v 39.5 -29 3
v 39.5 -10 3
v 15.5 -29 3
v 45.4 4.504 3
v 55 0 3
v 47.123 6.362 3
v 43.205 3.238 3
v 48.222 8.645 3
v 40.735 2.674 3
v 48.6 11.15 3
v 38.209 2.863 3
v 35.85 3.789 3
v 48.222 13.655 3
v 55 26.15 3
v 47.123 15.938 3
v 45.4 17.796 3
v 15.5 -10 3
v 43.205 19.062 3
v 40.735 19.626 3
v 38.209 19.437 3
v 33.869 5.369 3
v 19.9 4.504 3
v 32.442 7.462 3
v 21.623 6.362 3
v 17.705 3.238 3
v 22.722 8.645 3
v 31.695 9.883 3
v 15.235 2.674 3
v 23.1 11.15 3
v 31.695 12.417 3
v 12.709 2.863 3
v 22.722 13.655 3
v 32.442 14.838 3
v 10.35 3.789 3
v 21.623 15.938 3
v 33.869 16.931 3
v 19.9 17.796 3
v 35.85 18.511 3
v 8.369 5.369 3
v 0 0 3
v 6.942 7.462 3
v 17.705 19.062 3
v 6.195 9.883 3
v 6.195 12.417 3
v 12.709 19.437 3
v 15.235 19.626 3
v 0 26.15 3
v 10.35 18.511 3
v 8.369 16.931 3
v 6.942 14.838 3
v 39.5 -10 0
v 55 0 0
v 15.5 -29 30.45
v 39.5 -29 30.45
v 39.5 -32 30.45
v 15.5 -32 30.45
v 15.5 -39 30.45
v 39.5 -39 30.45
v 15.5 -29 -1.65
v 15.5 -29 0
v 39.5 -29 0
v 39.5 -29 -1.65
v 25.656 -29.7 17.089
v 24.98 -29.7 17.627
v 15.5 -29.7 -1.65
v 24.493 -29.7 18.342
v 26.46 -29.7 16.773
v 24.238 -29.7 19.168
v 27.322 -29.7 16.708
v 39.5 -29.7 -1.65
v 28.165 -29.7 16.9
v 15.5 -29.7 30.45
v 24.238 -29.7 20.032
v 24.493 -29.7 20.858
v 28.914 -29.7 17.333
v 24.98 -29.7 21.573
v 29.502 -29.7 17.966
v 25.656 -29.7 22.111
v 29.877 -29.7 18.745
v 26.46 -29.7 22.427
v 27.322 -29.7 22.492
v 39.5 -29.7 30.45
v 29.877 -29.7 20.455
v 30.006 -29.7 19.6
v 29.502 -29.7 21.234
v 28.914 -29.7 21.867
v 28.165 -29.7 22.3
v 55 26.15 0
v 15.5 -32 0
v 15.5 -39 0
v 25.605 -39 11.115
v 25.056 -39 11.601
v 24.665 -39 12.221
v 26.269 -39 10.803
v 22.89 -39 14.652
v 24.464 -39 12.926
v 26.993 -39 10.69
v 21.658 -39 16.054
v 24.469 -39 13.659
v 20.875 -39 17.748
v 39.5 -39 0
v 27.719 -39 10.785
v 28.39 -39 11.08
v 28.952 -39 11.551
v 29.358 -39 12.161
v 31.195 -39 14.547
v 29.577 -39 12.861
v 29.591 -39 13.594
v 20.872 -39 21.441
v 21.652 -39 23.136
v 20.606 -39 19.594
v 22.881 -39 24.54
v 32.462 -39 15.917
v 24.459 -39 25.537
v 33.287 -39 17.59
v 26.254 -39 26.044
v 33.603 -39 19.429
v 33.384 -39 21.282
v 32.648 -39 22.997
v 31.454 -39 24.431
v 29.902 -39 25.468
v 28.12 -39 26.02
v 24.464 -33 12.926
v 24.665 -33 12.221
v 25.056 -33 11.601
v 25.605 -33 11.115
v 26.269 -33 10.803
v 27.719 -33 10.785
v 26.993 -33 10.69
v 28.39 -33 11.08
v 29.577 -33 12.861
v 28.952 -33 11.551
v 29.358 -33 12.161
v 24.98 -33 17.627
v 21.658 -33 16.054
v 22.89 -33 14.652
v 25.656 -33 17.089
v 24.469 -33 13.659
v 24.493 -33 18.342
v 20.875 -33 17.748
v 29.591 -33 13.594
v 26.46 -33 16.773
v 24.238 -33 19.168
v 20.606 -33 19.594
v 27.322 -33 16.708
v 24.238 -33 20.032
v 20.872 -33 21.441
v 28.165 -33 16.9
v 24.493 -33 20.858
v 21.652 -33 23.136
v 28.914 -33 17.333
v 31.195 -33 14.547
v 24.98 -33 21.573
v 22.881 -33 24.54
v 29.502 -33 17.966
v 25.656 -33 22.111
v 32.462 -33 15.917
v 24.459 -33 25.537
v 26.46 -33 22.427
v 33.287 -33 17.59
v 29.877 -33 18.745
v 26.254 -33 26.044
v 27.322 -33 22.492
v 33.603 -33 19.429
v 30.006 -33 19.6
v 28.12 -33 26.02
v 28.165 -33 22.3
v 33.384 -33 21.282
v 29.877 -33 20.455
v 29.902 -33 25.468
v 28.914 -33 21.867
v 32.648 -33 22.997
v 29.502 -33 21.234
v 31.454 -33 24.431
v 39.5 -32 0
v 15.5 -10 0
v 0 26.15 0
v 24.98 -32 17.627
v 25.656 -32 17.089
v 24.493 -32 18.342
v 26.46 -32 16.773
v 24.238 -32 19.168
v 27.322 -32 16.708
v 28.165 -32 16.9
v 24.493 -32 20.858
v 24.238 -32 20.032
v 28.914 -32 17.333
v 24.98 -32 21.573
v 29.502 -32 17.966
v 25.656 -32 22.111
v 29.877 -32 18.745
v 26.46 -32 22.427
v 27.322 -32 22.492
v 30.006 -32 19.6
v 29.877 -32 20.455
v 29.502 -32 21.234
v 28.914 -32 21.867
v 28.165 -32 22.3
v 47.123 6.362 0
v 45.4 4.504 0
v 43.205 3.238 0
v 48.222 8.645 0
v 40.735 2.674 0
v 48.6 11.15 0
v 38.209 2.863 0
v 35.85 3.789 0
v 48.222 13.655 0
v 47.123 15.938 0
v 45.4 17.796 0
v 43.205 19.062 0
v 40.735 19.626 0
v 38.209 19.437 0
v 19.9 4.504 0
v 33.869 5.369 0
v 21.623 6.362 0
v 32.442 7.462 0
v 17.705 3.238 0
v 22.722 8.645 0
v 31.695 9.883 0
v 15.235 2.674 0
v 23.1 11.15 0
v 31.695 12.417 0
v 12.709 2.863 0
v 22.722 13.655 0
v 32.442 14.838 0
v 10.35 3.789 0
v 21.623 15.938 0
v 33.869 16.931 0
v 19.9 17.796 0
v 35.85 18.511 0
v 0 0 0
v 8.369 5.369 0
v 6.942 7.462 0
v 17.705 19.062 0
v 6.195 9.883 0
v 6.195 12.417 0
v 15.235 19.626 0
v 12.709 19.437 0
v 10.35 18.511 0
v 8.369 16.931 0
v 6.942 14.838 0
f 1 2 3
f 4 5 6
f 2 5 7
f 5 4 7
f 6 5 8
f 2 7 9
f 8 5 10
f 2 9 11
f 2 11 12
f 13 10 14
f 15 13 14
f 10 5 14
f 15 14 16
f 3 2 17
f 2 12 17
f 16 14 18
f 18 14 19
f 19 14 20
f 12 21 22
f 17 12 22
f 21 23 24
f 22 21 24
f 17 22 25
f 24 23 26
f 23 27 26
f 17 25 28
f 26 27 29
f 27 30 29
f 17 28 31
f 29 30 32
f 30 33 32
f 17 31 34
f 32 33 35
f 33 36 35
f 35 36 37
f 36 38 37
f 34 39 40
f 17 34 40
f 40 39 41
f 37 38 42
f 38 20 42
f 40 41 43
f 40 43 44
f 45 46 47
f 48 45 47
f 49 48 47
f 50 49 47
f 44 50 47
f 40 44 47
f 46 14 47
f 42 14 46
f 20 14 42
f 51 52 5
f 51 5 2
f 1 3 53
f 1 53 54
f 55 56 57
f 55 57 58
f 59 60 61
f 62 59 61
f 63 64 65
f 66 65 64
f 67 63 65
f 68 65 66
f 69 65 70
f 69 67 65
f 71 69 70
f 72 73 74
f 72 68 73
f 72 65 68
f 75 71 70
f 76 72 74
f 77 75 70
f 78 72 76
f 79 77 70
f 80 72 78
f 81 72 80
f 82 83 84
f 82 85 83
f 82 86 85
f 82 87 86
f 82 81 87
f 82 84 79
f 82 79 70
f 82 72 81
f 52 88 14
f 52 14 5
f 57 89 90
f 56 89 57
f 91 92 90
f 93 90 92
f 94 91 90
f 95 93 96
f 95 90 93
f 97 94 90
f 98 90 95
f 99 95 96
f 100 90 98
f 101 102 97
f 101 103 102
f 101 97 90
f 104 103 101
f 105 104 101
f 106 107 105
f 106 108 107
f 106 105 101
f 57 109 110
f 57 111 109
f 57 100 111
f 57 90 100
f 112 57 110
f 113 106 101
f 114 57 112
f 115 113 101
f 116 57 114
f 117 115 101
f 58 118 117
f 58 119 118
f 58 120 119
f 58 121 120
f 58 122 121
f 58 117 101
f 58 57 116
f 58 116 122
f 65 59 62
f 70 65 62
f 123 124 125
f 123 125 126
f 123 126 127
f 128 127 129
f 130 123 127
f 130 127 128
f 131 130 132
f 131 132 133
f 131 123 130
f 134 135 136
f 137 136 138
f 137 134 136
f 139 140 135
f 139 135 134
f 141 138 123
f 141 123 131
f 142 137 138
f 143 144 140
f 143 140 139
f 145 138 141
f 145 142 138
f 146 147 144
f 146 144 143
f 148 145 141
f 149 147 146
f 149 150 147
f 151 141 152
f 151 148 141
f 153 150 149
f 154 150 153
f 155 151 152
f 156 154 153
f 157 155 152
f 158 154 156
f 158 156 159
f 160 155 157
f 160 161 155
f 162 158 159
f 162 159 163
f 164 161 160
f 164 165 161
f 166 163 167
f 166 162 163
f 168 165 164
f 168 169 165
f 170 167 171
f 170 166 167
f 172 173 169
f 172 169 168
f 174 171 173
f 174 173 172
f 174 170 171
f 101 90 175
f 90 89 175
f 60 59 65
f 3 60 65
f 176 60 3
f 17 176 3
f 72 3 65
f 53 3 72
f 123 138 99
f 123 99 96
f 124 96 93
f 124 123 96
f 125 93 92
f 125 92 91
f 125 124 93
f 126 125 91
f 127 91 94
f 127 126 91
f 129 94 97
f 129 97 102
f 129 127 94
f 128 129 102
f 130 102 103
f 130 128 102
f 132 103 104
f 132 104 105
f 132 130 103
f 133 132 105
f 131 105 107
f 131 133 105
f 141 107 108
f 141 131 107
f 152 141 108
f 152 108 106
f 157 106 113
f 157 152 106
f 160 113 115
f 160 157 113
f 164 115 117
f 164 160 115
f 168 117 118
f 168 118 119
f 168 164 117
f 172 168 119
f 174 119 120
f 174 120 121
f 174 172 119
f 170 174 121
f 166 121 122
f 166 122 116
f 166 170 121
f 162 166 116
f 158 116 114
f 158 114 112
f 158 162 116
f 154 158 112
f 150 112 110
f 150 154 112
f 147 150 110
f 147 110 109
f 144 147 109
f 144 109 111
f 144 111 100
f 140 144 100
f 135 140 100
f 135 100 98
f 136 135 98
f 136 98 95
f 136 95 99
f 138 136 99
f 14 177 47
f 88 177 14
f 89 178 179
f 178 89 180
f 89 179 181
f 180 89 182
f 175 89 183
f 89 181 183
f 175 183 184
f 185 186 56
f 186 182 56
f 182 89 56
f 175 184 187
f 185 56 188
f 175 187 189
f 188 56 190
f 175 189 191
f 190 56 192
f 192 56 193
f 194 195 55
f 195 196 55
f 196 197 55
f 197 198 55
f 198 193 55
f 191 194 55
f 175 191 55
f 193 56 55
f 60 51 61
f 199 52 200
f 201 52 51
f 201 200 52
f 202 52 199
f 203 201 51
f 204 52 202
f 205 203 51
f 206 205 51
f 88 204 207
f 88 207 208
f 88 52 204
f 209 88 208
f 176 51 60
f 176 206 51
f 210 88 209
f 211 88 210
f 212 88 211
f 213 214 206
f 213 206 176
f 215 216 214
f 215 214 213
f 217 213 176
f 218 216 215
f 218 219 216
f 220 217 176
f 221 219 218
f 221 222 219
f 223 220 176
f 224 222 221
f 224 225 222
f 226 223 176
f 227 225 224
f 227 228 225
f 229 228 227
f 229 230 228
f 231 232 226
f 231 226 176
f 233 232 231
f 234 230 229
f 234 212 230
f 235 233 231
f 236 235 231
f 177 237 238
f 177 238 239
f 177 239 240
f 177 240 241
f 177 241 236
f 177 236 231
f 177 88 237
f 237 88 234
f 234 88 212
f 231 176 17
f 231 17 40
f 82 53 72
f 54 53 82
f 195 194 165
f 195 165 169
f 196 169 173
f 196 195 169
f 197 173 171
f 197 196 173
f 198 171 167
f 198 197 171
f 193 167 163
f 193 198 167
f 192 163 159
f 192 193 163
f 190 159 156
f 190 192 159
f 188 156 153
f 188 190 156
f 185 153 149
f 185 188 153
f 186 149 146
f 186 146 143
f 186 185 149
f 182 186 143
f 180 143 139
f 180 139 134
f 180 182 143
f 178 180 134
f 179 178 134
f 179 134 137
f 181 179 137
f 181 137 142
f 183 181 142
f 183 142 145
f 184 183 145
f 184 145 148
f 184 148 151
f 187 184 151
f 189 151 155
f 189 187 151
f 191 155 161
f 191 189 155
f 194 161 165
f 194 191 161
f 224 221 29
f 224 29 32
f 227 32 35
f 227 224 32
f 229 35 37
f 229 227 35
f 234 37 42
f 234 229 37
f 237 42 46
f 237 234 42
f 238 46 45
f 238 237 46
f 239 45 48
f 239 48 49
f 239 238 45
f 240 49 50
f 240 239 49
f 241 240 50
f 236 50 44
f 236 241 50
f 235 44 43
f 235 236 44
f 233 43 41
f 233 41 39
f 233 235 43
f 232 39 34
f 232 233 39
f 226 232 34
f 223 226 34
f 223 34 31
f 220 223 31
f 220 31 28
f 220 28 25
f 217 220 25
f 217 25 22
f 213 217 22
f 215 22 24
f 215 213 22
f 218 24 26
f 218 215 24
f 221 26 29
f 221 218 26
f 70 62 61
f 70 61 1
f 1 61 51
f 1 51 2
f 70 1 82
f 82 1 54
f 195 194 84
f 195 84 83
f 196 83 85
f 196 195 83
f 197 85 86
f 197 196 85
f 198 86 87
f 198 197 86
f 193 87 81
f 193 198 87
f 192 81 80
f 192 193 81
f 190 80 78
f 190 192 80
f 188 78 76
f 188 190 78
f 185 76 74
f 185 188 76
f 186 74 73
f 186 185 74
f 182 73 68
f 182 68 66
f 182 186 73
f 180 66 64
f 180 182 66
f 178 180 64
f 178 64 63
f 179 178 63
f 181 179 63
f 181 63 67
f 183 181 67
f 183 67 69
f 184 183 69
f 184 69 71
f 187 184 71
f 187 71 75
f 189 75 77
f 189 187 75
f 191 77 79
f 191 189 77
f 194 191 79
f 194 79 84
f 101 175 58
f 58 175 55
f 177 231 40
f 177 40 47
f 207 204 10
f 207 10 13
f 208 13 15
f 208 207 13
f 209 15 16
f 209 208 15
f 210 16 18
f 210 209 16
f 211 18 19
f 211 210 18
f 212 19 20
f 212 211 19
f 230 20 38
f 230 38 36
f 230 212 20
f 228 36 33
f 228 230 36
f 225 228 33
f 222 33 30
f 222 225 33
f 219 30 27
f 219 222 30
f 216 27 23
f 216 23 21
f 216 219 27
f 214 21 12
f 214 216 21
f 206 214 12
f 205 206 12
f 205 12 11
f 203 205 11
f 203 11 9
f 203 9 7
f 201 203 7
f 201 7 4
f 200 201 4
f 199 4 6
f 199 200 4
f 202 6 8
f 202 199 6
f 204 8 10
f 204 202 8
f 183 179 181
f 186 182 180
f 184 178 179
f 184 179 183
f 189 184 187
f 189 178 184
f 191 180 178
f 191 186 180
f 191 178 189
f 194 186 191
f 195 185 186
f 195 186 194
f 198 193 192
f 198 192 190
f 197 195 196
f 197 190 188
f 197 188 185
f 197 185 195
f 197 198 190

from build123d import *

# Parameters (mm, degrees)
ESBO_O1_R                     = 8.5
RESSALTO_EXTRUS_O2_DEPTH      = 3
ESBO_O2_W                     = 24
ESBO_O2_H                     = 3
RESSALTO_EXTRUS_O4_DEPTH      = 27.45
RESSALTO_EXTRUS_O4_DEPTH_BACK = 4.65
SKETCH2_W                     = 24
SKETCH2_H                     = 30.45
SKETCH2_R                     = 2.9
BOSS_EXTRUDE2_DEPTH           = 1
SKETCH3_R                     = 34.517349884
SKETCH3_R_2                   = 2.9
CUT_EXTRUDE1_DEPTH            = 2.3
SKETCH4_W                     = 24
SKETCH4_H                     = 30.45
BOSS_EXTRUDE3_DEPTH           = 6


with BuildPart() as part:
    # Esboço1 → Ressalto-extrusão2 (new body)
    with BuildSketch(Plane.XY):
        Polygon((0, 0), (0, 26.15), (55, 26.15), (55, 0), (39.5, -10), (39.5, -32), (15.5, -32), (15.5, -10), align=None)
        with Locations((40.1, 11.15)):
            Circle(ESBO_O1_R, mode=Mode.SUBTRACT)
        with Locations((14.6, 11.15)):
            Circle(ESBO_O1_R, mode=Mode.SUBTRACT)
    extrude(amount=RESSALTO_EXTRUS_O2_DEPTH)

    # Esboço2 → Ressalto-extrusão4 (add, two sides)
    with BuildSketch(Plane.XY.offset(3)) as ressalto_extrus_o4_sk:
        with Locations((27.5, -30.5)):
            Rectangle(ESBO_O2_W, ESBO_O2_H)
    extrude(amount=RESSALTO_EXTRUS_O4_DEPTH)
    extrude(ressalto_extrus_o4_sk.sketch, amount=-RESSALTO_EXTRUS_O4_DEPTH_BACK)

    # Sketch2 → Boss-Extrude2 (add)
    with BuildSketch(Plane.XZ.offset(32)):
        with Locations((27.5, 15.225)):
            Rectangle(SKETCH2_W, SKETCH2_H)
        with Locations((27.105704389, 19.6)):
            Circle(SKETCH2_R, mode=Mode.SUBTRACT)
    extrude(amount=BOSS_EXTRUDE2_DEPTH)

    # Sketch3 → Cut-Extrude1 (cut)
    with BuildSketch(Plane.XZ.offset(32)):
        with Locations((27.105704389, 19.6)):
            Circle(SKETCH3_R)
        with Locations((27.105704389, 19.6)):
            Circle(SKETCH3_R_2, mode=Mode.SUBTRACT)
    extrude(amount=-CUT_EXTRUDE1_DEPTH, mode=Mode.SUBTRACT)

    # Sketch4 → Boss-Extrude3 (add)
    with BuildSketch(Plane.XZ.offset(33)):
        with Locations((27.5, 15.225)):
            Rectangle(SKETCH4_W, SKETCH4_H)
        with BuildLine():
            ThreePointArc((29.590521878, 13.593696474), (27.188158144, 26.099477008), (24.469316606, 13.658665179))
            ThreePointArc((24.469316606, 13.658665179), (26.992674503, 10.69033729), (29.590521878, 13.593696474))
        make_face(mode=Mode.SUBTRACT)
    extrude(amount=BOSS_EXTRUDE3_DEPTH)


solid = part.part
